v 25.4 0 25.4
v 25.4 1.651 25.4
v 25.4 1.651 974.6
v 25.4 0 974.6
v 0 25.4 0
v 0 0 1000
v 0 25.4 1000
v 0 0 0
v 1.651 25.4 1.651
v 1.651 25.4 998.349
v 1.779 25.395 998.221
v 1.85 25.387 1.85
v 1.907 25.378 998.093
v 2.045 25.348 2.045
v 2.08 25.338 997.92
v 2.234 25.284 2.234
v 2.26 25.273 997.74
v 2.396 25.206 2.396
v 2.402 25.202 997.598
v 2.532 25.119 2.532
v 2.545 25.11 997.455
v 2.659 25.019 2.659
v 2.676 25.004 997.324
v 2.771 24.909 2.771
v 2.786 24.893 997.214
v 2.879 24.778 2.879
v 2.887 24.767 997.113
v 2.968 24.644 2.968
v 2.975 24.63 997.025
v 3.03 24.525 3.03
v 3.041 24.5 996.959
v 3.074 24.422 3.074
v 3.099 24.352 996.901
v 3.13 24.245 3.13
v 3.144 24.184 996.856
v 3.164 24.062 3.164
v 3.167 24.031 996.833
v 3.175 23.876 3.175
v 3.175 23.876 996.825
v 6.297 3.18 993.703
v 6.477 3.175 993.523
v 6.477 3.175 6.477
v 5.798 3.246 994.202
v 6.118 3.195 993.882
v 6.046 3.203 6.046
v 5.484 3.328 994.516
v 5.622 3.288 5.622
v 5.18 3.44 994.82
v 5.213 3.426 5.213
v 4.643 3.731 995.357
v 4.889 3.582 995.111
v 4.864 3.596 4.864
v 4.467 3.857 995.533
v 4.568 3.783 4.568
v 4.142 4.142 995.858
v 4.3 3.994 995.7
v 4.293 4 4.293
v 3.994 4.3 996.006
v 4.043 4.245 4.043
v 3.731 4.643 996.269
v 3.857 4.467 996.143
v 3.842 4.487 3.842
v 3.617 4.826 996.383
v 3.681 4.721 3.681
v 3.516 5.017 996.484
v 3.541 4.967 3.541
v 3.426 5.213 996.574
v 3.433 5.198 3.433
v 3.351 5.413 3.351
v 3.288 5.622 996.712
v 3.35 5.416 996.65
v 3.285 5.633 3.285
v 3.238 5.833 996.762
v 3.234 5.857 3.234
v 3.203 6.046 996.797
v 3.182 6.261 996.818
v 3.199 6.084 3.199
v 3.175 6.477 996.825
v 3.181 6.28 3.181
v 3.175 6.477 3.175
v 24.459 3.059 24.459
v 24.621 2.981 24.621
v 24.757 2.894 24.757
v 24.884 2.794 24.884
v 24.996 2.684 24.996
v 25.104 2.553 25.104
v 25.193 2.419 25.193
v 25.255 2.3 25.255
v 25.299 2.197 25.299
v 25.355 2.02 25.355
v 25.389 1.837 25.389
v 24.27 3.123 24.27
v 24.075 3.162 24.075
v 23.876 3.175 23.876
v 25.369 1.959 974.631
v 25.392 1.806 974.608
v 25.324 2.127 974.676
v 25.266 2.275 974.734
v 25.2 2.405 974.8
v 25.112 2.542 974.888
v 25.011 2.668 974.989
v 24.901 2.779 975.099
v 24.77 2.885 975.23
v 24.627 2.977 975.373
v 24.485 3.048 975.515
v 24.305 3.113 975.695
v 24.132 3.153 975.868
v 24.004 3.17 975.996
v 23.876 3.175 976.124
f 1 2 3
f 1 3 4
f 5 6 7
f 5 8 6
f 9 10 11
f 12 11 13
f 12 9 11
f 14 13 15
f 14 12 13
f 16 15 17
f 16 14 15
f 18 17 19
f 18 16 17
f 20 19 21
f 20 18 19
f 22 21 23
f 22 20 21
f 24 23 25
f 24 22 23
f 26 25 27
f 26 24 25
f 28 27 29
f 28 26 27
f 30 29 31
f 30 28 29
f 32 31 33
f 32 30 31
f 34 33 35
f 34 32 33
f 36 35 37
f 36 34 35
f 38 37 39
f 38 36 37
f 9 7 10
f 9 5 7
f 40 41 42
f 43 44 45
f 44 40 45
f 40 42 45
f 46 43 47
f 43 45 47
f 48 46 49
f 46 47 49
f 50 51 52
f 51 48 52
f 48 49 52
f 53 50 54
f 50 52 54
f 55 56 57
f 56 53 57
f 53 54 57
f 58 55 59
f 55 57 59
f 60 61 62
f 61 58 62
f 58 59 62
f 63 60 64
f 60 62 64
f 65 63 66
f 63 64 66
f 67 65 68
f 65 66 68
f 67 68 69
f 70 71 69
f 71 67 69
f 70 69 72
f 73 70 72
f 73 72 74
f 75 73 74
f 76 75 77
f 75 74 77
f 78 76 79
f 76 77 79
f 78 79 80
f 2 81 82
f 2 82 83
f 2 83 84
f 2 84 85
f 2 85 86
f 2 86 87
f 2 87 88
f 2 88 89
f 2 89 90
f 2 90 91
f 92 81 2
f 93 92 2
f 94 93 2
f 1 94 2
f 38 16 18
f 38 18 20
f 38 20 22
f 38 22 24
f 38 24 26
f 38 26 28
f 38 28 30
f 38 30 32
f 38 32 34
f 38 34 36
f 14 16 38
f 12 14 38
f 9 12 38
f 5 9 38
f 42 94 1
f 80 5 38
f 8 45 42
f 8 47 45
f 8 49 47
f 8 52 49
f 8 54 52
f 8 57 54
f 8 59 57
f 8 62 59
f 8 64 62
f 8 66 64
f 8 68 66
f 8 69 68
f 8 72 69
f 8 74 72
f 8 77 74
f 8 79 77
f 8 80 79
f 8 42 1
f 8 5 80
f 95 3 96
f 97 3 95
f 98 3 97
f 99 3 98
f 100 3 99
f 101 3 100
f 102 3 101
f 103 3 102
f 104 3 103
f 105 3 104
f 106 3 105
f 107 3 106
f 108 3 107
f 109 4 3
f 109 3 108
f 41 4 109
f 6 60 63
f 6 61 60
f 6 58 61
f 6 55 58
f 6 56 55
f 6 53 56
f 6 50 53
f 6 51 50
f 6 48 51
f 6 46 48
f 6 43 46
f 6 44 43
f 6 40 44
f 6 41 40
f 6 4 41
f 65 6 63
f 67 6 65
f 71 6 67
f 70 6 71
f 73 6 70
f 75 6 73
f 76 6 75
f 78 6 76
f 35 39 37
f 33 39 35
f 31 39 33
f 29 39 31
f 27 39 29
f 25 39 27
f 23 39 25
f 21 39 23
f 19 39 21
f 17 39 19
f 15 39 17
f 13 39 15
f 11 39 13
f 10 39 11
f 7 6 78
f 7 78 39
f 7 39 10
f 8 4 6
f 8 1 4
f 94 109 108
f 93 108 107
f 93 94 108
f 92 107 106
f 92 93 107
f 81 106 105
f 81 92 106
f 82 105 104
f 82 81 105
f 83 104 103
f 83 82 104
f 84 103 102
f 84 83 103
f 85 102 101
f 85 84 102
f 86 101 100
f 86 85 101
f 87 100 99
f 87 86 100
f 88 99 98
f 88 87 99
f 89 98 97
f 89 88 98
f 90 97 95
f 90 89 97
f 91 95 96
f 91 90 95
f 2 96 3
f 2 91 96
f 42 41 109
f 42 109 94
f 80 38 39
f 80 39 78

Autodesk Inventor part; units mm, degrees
ref_plane "Start Plane" through (0, 0, 0) normal (0, 0, 1) x (1, 0, 0)
ref_plane "End Plane" through (0, 0, 1000) normal (0, 0, 1) x (1, 0, 0)
sketch "Sketch" plane through (0, 0, 0) normal (0, 0, 1) x (1, 0, 0)
  line L0 (25.4, 0) -> (0, 0)
  line L1 (0, 0) -> (0, 25.4)
  line L2 (0, 25.4) -> (1.651, 25.4)
  line L3 (3.175, 23.876) -> (3.175, 6.477)
  line L4 (6.477, 3.175) -> (23.876, 3.175)
  line L5 (25.4, 1.651) -> (25.4, 0)
  line L6 (0, -11.0414) -> (0, 31.5385) construction
  line L7 (-11.0414, 0) -> (31.5385, 0) construction
  arc A0 (3.175, 6.477) -> (6.477, 3.175) centre (6.477, 6.477) ccw
  arc A1 (3.175, 23.876) -> (1.651, 25.4) centre (1.651, 23.876) ccw
  arc A2 (25.4, 1.651) -> (23.876, 3.175) centre (23.876, 1.651) ccw
  line L8 (0, 40.0545) -> (0, -19.5574) construction
  line L9 (-19.5574, 0) -> (40.0545, 0) construction
  point P0 (3.175, 25.4)
  point P1 (3.175, 3.175)
  point P2 (25.4, 3.175)
  dimension "d0" = 25.4
  dimension "d1" = 25.4
  dimension "d2" = 3.175
  dimension "d3" = 3.175
  dimension "d10" = 0
  dimension "d11" = 0
  dimension "d14" = 3.302
  dimension "d15" = 1.524
extrude "Body" add sketch "Sketch" along normal up to surface (1000 mm away) from surface at 0
sketch "Sketch3" plane through (0, 0, 0) normal (0, 0, 1) x (1, 0, 0)
  line L0 (0, 0) -> (10, 0)
ref_plane "Work Plane3" through (0, 0, 0) normal (0, -1, 0) x (1, 0, 0)
ref_plane "Work Plane4" through (0, 12.7, 1000) normal (0.7071, 0, 0.7071) x (0.7071, 0, -0.7071)
split "Split1" plane through (0, 12.7, 1000) removes the side toward (0.7071, 0, 0.7071)
ref_plane "Work Plane5" through (0, 12.7, 0) normal (0.7071, 0, -0.7071) x (-0.7071, 0, -0.7071)
split "Split2" plane through (0, 12.7, 0) removes the side toward (0.7071, 0, -0.7071)
sketch "Sketch4" plane through (0, 0, 0) normal (0, -1, 0) x (1, 0, 0)
  line L0 (-2, 0) -> (12, 0) projected
  line L1 (-2, 1000) -> (12, 1000) projected
  dimension "d17" = 1000
equation "\"d0\" = G_H"
equation "\"d1\" = G_H"
equation "\"d2\" = G_T"
equation "\"d3\" = G_T"
equation "\"d14\" = G_IR"
equation "\"d15\" = G_ER"
equation "\"d4\" = G_L"
equation "\"G_H\" = 25.4"
equation "\"G_T\" = 3.175"
equation "\"G_ER\" = 1.524"
equation "\"G_IR\" = 3.302"
equation "\"G_L\" = d17"
equation "\"ex\" = 0"
equation "\"G_OFFSET_START\" = 0"
equation "\"G_OFFSET_END\" = 0"
properties part number "AISC - L 1 x 1 x 1/8 - 39.37" material "Steel, Mild"
